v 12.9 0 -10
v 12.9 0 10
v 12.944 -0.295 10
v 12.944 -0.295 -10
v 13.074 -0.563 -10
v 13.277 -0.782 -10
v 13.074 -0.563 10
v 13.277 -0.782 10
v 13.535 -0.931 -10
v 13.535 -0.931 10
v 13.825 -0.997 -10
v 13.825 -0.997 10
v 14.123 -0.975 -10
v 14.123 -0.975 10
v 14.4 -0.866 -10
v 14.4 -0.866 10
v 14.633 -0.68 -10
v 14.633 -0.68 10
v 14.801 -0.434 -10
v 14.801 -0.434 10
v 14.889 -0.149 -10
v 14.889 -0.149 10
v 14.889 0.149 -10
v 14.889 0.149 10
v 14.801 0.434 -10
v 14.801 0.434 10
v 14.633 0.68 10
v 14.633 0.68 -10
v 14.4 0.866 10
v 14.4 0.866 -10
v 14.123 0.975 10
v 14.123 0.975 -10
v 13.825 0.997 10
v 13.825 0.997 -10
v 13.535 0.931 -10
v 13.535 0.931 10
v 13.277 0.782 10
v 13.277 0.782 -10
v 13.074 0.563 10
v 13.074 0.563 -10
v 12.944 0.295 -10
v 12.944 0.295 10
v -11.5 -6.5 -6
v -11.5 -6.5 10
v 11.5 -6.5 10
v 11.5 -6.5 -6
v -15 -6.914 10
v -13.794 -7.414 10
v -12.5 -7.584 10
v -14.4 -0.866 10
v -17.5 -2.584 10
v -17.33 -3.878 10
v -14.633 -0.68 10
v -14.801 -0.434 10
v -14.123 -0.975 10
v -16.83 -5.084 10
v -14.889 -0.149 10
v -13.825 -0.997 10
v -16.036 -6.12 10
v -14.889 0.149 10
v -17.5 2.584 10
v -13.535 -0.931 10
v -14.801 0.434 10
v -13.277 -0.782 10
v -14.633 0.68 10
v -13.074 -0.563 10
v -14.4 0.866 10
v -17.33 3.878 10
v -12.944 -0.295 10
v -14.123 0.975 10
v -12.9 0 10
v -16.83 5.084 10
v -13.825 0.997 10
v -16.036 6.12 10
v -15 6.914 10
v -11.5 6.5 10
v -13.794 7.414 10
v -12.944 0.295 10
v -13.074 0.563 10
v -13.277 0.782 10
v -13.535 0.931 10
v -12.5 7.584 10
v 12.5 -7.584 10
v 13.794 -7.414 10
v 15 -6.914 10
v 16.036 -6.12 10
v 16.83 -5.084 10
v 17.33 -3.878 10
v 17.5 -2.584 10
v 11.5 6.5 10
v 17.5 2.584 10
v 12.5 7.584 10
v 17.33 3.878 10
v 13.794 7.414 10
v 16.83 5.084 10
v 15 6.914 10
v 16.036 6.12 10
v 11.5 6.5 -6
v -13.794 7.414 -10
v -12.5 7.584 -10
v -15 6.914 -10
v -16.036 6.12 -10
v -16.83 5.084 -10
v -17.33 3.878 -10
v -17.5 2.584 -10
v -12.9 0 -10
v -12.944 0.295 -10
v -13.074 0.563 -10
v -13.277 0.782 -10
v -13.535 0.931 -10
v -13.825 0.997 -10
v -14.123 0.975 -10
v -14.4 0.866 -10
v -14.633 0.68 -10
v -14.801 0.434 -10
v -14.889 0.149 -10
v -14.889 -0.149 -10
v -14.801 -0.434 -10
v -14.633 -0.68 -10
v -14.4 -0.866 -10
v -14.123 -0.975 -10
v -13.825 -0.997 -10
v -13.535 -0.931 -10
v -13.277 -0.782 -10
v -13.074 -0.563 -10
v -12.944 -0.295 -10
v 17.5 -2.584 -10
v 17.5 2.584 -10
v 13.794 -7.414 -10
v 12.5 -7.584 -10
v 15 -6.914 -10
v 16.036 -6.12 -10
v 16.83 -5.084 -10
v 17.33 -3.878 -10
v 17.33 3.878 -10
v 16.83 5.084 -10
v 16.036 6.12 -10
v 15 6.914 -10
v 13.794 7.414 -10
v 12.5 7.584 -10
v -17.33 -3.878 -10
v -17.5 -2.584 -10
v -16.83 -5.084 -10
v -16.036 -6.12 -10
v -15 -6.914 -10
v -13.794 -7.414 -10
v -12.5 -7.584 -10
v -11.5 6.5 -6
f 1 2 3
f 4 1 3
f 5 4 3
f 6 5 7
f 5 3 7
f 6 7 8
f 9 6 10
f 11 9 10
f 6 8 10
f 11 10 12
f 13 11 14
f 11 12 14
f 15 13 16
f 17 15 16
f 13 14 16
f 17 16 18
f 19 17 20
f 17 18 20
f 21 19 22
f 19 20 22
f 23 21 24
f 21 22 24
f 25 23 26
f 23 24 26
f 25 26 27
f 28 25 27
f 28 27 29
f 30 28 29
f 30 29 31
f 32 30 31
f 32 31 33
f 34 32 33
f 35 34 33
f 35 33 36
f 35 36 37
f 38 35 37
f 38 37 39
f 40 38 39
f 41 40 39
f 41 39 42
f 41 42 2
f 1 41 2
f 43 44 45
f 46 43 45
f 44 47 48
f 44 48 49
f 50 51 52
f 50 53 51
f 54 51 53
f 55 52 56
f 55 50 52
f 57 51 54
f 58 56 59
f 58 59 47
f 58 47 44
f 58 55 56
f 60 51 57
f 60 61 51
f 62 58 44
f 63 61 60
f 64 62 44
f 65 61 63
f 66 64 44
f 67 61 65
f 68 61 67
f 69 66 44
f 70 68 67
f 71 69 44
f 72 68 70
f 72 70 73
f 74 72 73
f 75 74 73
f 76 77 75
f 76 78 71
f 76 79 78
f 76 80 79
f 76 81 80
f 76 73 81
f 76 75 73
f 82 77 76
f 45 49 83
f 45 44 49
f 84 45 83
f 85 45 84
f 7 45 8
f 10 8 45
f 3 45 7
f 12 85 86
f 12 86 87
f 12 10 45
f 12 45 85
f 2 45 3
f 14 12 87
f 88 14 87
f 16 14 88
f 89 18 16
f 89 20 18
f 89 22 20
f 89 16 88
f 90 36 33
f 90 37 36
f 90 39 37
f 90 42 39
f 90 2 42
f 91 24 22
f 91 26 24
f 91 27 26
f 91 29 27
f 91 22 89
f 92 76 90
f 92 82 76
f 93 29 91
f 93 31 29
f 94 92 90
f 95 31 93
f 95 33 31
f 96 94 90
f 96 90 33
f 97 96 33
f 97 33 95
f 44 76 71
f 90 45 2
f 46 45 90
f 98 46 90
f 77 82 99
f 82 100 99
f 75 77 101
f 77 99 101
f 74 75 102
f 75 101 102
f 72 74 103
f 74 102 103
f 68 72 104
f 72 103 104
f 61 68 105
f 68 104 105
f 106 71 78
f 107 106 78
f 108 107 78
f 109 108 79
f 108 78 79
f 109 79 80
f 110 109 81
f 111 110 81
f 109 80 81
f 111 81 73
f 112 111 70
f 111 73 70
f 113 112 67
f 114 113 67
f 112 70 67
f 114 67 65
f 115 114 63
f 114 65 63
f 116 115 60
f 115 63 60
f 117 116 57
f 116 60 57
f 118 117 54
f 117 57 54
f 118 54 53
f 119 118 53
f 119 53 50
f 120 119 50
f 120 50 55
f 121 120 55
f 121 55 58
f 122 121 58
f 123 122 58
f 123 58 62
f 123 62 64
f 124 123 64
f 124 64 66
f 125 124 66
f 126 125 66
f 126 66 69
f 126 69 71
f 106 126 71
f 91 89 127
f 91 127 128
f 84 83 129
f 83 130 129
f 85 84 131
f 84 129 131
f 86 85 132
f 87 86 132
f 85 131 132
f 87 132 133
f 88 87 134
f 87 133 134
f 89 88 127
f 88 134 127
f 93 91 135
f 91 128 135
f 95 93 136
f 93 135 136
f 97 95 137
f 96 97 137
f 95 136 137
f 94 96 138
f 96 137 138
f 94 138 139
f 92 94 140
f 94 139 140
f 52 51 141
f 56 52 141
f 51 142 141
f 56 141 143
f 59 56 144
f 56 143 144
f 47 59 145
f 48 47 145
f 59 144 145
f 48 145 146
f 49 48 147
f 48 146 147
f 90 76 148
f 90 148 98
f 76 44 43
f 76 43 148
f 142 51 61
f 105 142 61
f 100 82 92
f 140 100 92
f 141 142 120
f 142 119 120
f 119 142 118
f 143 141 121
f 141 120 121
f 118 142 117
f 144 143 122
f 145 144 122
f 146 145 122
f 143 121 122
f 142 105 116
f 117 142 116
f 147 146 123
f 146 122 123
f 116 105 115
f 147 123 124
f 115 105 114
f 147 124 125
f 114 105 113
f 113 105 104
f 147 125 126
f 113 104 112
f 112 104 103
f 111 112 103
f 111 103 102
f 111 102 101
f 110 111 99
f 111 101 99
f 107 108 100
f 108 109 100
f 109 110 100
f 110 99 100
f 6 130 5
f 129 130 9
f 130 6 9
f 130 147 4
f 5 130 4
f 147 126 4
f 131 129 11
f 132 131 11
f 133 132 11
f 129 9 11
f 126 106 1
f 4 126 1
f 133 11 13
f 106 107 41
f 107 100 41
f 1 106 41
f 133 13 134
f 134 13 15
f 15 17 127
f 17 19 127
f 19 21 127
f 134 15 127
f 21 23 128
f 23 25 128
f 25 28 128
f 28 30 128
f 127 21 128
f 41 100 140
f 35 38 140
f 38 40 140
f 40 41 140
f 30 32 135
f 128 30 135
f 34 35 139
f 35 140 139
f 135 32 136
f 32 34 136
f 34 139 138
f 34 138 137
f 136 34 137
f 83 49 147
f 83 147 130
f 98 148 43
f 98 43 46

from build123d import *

# Parameters (mm, degrees)
SKETCH1_W           = 35
SKETCH1_H           = 25
BOSS_EXTRUDE1_DEPTH = 10
SKETCH2_W           = 23
SKETCH2_H           = 13
CUT_EXTRUDE1_DEPTH  = 16
CUT_EXTRUDE3_REACH  = 31.368
SKETCH4_W           = 35
SKETCH4_H           = 4.915686931
FILLET2_R           = 5
FILLET3_R           = 5
FILLET4_R           = 5
FILLET5_R           = 5
CUT_EXTRUDE4_REACH  = 29.636
SKETCH3_R           = 1


with BuildPart() as part:
    # Sketch1 → Boss-Extrude1 (new, symmetric)
    with BuildSketch(Plane.XY):
        Rectangle(SKETCH1_W, SKETCH1_H)
    extrude(amount=BOSS_EXTRUDE1_DEPTH, both=True)

    # Sketch2 → Cut-Extrude1 (cut)
    with BuildSketch(Plane.XY.offset(10)):
        Rectangle(SKETCH2_W, SKETCH2_H)
    extrude(amount=-CUT_EXTRUDE1_DEPTH, mode=Mode.SUBTRACT)

    # Sketch4 → Cut-Extrude3 (cut, up to next)
    with BuildSketch(Plane.XY.offset(10), mode=Mode.PRIVATE) as cut_extrude3_sk1:
        with Locations((0, 10.042156535)):
            Rectangle(SKETCH4_W, SKETCH4_H)
    cut_extrude3_tool1 = extrude(cut_extrude3_sk1.sketch, amount=-CUT_EXTRUDE3_REACH, mode=Mode.PRIVATE) & part.part
    # Sketch4 → Cut-Extrude3 (cut, up to next)
    with BuildSketch(Plane.XY.offset(10), mode=Mode.PRIVATE) as cut_extrude3_sk2:
        with Locations((0, -10.042156535)):
            Rectangle(SKETCH4_W, SKETCH4_H)
    cut_extrude3_tool2 = extrude(cut_extrude3_sk2.sketch, amount=-CUT_EXTRUDE3_REACH, mode=Mode.PRIVATE) & part.part
    add(cut_extrude3_tool1.solids().sort_by_distance((0, 10.042157, 10))[0], mode=Mode.SUBTRACT)
    add(cut_extrude3_tool2.solids().sort_by_distance((0, -10.042157, 10))[0], mode=Mode.SUBTRACT)

    # Fillet2
    fillet2_edges = [part.edges().sort_by_distance(p)[0] for p in [
        (17.5, -7.584313069, 0),
    ]]
    fillet(fillet2_edges, radius=FILLET2_R)

    # Fillet3
    fillet3_edges = [part.edges().sort_by_distance(p)[0] for p in [
        (17.5, 7.584313069, 0),
    ]]
    fillet(fillet3_edges, radius=FILLET3_R)

    # Fillet4
    fillet4_edges = [part.edges().sort_by_distance(p)[0] for p in [
        (-17.5, 7.584313069, 0),
    ]]
    fillet(fillet4_edges, radius=FILLET4_R)

    # Fillet5
    fillet5_edges = [part.edges().sort_by_distance(p)[0] for p in [
        (-17.5, -7.584313069, 0),
    ]]
    fillet(fillet5_edges, radius=FILLET5_R)

    # Sketch3 → Cut-Extrude4 (cut, up to next)
    with BuildSketch(Plane.XY.offset(10), mode=Mode.PRIVATE) as cut_extrude4_sk1:
        with Locations((-13.9, 0)):
            Circle(SKETCH3_R)
    cut_extrude4_tool1 = extrude(cut_extrude4_sk1.sketch, amount=-CUT_EXTRUDE4_REACH, mode=Mode.PRIVATE) & part.part
    # Sketch3 → Cut-Extrude4 (cut, up to next)
    with BuildSketch(Plane.XY.offset(10), mode=Mode.PRIVATE) as cut_extrude4_sk2:
        with Locations(Location((13.9, 0, 0), (0, 0, 180))):
            Circle(SKETCH3_R)
    cut_extrude4_tool2 = extrude(cut_extrude4_sk2.sketch, amount=-CUT_EXTRUDE4_REACH, mode=Mode.PRIVATE) & part.part
    add(cut_extrude4_tool1.solids().sort_by_distance((-13.9, 0, 10))[0], mode=Mode.SUBTRACT)
    add(cut_extrude4_tool2.solids().sort_by_distance((13.9, 0, 10))[0], mode=Mode.SUBTRACT)


solid = part.part
